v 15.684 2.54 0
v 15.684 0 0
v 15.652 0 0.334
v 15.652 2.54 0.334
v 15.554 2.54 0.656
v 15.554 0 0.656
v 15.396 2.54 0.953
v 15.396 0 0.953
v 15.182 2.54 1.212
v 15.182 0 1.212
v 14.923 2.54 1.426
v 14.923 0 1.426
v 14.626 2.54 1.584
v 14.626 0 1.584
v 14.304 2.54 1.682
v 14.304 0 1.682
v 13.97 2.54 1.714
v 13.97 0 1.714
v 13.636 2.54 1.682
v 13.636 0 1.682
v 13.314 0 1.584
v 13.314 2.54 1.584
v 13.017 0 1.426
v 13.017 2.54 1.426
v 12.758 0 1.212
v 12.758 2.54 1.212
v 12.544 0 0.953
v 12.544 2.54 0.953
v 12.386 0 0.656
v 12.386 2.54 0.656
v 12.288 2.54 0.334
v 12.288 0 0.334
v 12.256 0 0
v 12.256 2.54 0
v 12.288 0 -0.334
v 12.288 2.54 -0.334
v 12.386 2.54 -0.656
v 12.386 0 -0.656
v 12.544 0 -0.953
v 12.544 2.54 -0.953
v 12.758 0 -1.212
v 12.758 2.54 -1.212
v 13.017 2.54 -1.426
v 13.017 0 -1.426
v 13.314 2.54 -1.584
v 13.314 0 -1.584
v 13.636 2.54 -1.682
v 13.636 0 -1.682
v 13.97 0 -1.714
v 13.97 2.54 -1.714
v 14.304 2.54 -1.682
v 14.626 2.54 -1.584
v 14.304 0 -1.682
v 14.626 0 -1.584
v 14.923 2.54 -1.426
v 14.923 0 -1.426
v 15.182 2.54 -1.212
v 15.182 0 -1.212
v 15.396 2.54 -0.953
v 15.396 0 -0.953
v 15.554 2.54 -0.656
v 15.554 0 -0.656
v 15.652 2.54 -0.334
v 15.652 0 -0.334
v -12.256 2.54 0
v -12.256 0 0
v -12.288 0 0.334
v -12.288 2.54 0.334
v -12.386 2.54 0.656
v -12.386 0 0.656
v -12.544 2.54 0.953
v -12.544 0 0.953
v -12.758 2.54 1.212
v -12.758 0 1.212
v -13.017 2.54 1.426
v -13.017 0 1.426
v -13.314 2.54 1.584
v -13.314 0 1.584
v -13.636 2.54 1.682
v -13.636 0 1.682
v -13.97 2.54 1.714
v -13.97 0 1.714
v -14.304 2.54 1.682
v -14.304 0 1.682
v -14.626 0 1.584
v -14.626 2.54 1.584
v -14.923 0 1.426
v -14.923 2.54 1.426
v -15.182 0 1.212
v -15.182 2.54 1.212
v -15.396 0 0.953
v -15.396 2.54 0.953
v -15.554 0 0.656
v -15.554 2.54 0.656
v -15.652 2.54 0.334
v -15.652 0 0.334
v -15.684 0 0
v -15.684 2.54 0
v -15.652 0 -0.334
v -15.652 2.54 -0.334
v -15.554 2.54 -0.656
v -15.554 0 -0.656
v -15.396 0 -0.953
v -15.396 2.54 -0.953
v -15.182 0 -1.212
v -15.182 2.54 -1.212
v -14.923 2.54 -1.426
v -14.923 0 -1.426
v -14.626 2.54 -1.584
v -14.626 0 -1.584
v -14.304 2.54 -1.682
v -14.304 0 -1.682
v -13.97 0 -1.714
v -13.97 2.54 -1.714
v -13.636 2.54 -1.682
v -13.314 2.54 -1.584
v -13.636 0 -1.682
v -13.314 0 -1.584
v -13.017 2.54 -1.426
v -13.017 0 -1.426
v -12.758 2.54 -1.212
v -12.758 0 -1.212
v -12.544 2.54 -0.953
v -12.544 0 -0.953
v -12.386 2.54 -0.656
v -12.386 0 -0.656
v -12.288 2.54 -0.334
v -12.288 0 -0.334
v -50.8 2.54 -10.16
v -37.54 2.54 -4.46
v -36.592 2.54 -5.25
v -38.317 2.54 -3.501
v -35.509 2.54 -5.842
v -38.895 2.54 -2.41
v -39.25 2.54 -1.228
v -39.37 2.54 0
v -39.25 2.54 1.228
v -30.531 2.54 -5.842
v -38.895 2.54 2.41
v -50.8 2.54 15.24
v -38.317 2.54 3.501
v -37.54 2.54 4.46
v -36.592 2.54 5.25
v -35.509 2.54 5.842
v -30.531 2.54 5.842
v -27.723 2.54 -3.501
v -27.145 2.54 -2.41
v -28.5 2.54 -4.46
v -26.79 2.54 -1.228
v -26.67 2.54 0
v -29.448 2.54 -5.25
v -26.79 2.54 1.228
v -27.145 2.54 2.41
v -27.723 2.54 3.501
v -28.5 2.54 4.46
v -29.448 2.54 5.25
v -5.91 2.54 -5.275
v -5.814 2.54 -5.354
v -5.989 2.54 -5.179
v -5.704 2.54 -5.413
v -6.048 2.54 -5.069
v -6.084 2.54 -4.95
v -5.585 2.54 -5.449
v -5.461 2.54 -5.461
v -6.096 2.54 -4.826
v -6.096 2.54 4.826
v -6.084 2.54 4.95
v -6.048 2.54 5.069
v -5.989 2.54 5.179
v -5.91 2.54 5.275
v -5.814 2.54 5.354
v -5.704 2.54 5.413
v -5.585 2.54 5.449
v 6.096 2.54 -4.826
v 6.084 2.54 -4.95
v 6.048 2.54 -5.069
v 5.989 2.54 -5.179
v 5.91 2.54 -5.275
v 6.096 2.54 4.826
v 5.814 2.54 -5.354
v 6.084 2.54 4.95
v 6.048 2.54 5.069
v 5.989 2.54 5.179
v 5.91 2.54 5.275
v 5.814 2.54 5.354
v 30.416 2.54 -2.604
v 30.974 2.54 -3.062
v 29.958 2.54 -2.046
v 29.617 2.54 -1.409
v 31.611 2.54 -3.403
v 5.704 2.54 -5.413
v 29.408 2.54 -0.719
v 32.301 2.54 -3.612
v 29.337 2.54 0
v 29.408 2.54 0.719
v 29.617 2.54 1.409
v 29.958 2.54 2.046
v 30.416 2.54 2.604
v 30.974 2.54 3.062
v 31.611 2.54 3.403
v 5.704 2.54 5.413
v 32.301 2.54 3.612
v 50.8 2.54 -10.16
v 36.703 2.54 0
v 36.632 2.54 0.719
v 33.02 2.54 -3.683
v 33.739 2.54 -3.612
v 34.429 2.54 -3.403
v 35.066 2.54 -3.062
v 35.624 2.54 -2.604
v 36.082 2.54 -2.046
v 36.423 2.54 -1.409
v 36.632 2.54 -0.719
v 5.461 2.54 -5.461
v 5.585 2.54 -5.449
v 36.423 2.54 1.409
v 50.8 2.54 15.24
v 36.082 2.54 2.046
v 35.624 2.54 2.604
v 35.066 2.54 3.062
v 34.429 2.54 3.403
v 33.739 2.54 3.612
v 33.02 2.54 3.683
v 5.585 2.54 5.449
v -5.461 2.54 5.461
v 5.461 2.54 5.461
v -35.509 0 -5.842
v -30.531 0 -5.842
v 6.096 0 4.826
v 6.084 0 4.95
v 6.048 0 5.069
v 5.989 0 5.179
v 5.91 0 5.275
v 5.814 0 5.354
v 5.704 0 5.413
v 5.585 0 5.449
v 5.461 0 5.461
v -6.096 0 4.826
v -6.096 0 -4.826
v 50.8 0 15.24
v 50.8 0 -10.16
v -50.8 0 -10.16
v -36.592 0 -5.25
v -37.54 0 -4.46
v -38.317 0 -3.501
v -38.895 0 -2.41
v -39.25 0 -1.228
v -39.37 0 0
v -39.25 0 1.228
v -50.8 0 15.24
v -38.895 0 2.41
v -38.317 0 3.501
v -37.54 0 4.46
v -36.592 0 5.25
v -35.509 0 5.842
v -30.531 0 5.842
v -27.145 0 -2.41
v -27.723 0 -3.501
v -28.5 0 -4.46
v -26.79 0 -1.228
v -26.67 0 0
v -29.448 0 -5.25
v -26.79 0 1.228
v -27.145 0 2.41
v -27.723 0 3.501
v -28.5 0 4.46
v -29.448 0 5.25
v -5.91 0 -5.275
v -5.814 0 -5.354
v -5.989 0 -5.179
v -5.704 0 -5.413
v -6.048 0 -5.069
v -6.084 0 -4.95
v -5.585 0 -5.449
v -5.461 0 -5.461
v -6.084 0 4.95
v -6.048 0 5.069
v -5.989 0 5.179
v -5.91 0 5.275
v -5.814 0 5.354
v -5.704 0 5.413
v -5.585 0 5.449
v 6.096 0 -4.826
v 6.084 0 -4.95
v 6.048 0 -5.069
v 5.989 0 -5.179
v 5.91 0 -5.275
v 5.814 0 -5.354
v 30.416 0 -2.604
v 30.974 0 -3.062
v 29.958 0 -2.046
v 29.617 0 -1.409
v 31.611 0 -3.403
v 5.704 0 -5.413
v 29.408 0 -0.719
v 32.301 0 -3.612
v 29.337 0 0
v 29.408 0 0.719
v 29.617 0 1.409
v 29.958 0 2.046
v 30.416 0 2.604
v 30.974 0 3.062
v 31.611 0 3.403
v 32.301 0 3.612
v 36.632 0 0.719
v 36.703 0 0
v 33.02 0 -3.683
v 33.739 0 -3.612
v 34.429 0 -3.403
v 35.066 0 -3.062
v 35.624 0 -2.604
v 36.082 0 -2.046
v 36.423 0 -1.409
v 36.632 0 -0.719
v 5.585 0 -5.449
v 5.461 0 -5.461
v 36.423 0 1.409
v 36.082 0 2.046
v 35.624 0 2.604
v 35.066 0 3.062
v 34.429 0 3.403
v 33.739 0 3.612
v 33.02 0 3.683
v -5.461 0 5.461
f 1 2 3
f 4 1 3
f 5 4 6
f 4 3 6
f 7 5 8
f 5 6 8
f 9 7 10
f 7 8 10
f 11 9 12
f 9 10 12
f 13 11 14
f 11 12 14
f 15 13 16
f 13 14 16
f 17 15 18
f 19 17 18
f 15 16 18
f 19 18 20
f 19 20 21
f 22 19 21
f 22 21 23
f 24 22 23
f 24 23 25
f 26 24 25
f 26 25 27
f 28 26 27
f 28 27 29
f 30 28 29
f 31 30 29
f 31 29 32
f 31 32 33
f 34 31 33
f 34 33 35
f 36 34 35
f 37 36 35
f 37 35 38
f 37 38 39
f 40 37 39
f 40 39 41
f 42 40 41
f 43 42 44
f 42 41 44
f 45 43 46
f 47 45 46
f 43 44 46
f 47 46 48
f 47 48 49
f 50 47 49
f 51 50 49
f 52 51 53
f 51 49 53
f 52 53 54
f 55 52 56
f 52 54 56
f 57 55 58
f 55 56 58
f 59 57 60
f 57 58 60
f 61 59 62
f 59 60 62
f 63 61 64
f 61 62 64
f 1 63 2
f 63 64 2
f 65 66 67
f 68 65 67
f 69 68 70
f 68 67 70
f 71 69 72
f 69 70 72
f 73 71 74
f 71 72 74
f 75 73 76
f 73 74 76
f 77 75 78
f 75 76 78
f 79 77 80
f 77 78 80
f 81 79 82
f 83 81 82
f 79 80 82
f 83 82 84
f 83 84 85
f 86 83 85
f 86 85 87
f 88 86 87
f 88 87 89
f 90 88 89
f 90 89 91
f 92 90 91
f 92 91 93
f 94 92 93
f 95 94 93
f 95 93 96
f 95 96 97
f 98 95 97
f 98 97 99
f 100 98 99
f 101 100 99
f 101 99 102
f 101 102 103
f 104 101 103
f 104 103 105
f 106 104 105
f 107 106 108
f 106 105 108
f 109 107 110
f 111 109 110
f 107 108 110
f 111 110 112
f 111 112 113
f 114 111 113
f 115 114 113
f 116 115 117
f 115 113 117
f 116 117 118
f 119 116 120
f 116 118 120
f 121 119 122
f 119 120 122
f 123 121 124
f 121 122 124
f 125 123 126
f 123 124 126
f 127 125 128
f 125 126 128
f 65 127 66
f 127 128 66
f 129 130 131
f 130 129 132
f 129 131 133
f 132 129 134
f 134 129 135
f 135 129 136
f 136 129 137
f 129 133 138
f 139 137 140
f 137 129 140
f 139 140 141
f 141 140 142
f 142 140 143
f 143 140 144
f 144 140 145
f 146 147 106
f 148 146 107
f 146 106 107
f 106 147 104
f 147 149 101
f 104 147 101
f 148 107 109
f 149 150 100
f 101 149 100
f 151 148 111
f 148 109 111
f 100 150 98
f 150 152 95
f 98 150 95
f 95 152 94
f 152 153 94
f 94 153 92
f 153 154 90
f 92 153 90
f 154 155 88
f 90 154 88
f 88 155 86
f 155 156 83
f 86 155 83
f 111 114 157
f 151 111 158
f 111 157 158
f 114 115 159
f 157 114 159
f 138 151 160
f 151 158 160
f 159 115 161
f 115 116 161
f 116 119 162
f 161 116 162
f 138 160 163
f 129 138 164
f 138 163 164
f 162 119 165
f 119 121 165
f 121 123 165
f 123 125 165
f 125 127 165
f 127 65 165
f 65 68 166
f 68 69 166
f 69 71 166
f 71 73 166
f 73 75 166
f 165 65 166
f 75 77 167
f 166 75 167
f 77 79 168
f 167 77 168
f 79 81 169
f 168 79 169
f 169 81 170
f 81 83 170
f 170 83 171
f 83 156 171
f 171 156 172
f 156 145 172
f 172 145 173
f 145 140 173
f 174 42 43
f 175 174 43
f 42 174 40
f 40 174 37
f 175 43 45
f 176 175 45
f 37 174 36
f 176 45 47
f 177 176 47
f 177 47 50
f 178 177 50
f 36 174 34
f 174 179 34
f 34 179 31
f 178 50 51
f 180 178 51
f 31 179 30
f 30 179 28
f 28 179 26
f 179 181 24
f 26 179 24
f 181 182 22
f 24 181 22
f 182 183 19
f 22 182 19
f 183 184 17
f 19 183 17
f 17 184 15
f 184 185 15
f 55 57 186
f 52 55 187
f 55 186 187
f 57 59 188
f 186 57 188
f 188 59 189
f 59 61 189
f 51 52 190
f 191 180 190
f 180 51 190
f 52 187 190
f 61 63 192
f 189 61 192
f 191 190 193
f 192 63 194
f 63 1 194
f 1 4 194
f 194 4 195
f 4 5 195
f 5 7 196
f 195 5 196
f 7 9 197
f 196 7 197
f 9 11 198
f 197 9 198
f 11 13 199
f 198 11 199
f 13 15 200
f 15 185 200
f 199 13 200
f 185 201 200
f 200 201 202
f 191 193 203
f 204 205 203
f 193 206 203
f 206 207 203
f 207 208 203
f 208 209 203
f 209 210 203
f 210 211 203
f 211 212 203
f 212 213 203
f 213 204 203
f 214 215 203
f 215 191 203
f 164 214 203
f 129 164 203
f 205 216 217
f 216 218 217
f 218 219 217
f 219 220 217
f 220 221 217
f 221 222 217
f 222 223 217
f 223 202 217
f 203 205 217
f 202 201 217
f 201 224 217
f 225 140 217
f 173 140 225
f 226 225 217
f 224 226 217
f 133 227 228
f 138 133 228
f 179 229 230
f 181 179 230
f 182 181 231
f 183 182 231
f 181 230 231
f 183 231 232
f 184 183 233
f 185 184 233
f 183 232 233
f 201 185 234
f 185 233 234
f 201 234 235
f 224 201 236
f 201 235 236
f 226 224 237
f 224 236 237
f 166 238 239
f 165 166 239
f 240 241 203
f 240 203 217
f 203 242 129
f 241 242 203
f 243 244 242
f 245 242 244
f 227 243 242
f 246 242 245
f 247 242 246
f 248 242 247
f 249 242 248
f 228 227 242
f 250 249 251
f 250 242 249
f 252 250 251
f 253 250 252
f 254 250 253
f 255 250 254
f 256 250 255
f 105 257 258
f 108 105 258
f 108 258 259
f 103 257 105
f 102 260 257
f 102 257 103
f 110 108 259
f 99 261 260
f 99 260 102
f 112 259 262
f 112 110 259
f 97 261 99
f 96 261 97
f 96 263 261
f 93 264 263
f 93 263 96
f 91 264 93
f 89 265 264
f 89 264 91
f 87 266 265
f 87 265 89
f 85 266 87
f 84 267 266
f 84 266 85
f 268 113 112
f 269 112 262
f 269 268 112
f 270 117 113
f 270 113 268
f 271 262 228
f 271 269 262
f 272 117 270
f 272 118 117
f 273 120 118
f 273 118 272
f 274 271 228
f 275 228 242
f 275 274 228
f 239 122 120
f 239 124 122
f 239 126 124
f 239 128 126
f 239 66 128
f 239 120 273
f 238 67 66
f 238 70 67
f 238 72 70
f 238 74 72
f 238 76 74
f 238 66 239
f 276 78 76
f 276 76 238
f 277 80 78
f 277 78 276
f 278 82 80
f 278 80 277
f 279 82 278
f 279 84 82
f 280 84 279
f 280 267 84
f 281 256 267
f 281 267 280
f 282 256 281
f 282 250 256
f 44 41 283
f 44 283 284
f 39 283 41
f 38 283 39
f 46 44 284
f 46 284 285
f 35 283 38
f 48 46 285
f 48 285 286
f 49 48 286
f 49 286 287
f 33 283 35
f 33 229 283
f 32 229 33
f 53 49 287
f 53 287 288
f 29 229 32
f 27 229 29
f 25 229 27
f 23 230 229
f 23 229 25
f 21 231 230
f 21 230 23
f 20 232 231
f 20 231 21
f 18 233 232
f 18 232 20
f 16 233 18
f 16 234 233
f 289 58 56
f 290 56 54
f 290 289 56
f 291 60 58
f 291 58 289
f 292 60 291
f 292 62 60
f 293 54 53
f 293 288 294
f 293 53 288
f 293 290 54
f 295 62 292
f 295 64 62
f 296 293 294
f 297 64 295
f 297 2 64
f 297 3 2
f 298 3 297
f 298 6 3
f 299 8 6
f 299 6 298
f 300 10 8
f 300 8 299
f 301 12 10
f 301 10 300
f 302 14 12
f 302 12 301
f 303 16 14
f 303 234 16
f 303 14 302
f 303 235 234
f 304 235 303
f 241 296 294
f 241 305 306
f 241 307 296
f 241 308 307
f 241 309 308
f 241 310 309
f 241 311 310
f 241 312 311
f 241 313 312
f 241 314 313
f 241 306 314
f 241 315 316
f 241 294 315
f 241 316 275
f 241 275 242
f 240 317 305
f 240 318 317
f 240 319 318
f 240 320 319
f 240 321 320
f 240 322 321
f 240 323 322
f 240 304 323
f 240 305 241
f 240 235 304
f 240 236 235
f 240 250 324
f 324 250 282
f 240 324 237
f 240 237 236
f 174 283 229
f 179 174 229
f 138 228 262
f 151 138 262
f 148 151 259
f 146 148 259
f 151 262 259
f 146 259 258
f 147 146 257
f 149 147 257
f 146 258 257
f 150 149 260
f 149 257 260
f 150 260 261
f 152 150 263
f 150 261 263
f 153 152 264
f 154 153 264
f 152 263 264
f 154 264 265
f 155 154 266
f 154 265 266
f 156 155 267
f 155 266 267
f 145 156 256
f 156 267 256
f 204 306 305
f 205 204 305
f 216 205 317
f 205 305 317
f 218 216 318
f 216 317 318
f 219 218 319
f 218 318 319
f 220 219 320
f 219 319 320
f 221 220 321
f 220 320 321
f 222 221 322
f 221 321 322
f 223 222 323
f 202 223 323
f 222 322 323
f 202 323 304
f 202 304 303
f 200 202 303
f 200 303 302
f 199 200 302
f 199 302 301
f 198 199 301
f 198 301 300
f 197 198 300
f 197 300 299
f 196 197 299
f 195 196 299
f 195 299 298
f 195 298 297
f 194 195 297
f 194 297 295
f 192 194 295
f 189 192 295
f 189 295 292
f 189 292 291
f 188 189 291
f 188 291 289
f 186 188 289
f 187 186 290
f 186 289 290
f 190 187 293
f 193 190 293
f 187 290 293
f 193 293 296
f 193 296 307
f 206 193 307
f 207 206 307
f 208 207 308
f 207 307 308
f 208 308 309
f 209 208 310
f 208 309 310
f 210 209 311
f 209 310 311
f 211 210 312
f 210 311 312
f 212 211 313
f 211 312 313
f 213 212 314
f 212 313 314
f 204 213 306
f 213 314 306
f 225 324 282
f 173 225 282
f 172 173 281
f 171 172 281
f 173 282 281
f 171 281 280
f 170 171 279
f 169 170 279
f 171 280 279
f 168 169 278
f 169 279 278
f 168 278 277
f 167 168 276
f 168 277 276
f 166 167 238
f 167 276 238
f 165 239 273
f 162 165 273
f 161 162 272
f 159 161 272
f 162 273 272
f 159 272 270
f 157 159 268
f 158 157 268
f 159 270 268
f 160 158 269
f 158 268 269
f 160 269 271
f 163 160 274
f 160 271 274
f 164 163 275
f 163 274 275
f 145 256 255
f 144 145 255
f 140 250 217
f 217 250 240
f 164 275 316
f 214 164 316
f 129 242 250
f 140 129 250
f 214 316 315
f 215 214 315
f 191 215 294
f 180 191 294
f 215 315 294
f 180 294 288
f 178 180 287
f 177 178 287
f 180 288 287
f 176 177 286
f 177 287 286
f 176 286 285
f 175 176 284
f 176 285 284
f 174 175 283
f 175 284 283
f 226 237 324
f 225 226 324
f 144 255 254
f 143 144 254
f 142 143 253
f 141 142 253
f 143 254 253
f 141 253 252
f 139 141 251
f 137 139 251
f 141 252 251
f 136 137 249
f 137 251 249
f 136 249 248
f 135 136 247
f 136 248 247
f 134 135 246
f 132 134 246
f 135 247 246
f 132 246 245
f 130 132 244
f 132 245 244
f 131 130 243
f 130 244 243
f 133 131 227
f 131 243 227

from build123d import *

# Parameters (mm, degrees)
F0_W     = 101.6
F0_H     = 25.4
F1_DEPTH = 2.54
F2_R     = 1.7145
F2_R_2   = 3.683
F3_DEPTH = 2.541


with BuildPart() as f1:
    # F0 (on Front) → F1 (new body)
    with BuildSketch(Plane.XZ):
        with Locations((0, 2.54)):
            Rectangle(F0_W, F0_H)
    extrude(amount=-F1_DEPTH)

    # F2 (on face) → F3 (cut, through all)
    with BuildSketch(Plane.XZ):
        with BuildLine():
            Line((-30.531318, 5.842), (-35.508682, 5.842))
            ThreePointArc((-35.508682, 5.842), (-39.37, 0), (-35.508682, -5.842))
            Line((-35.508682, -5.842), (-30.531318, -5.842))
            ThreePointArc((-30.531318, -5.842), (-26.67, 0), (-30.531318, 5.842))
        make_face()
        with Locations((-13.97, 0)):
            Circle(F2_R)
        with Locations((13.97, 0)):
            Circle(F2_R)
        with Locations((33.02, 0)):
            Circle(F2_R_2)
        with BuildLine():
            ThreePointArc((6.096, 4.826), (5.910013, 5.275013), (5.461, 5.461))
            Line((5.461, 5.461), (-5.461, 5.461))
            ThreePointArc((-5.461, 5.461), (-5.910013, 5.275013), (-6.096, 4.826))
            Line((-6.096, 4.826), (-6.096, -4.826))
            ThreePointArc((-6.096, -4.826), (-5.910013, -5.275013), (-5.461, -5.461))
            Line((-5.461, -5.461), (5.461, -5.461))
            ThreePointArc((5.461, -5.461), (5.910013, -5.275013), (6.096, -4.826))
            Line((6.096, -4.826), (6.096, 4.826))
        make_face()
    extrude(amount=-F3_DEPTH, mode=Mode.SUBTRACT)


solid = f1.part
